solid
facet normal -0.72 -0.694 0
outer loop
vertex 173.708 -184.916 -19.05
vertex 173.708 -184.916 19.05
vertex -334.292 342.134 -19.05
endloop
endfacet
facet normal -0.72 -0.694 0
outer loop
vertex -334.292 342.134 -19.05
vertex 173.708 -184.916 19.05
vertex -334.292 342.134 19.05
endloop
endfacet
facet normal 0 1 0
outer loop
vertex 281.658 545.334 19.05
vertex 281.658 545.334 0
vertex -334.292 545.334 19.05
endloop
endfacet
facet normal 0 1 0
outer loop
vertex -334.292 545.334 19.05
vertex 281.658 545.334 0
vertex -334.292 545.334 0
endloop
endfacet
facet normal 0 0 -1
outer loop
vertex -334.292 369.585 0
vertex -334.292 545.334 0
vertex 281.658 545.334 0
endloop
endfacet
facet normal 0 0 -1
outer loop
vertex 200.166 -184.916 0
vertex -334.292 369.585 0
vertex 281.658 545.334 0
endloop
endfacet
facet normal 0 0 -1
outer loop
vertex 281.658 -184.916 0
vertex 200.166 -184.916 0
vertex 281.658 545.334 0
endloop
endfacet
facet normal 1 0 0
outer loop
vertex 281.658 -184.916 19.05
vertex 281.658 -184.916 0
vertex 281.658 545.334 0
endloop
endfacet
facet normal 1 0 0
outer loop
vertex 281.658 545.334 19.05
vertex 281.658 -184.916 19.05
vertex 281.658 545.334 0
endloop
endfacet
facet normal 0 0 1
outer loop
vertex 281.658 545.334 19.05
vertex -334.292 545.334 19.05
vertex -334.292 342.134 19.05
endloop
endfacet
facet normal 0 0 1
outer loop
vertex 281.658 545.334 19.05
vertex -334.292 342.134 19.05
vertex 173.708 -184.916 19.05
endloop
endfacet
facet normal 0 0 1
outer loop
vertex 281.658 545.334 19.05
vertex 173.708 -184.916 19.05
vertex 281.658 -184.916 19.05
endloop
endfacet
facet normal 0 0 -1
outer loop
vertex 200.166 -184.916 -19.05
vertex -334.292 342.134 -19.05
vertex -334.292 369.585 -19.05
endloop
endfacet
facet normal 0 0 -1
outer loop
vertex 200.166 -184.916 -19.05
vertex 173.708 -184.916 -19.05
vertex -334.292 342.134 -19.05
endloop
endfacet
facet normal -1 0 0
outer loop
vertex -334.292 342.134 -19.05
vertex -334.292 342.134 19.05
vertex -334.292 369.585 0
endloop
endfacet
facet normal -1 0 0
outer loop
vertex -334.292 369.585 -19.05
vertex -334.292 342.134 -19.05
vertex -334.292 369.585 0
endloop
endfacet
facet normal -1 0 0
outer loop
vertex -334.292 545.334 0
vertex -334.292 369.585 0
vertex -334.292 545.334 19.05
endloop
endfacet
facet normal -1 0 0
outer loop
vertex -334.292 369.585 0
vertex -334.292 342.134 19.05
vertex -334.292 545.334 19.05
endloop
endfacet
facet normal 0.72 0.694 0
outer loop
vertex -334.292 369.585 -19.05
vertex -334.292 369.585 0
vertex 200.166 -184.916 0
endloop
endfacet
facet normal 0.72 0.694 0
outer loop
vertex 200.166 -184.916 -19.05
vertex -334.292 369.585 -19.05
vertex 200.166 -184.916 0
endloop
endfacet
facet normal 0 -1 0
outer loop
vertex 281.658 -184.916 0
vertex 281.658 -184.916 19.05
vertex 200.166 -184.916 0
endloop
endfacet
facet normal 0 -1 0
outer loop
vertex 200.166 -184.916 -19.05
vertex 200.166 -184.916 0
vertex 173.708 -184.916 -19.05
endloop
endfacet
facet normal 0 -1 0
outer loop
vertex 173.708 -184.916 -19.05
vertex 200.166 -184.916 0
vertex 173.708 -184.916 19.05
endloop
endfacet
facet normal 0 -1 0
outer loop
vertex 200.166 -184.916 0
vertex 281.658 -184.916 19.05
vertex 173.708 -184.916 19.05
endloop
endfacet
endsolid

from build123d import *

# Parameters (mm, degrees)
F1_DEPTH = 19.05
F3_DEPTH = 19.05


with BuildPart() as f1:
    # F0 (on Top) → F1 (new body)
    with BuildSketch(Plane.XY):
        Polygon((281.657545, 545.334344), (-334.292455, 545.334344), (-334.292455, 342.134344), (173.707545, -184.915656), (281.657545, -184.915656), align=None)
    extrude(amount=F1_DEPTH)

    # F2 (on face) → F3 (join)
    with BuildSketch(Plane(origin=(0, 0, 0), x_dir=(1, 0, 0), z_dir=(0, 0, -1))):
        Polygon((-334.292455, -342.134344), (-334.292455, -369.5849), (200.165912, 184.915656), (173.707545, 184.915656), align=None)
    extrude(amount=F3_DEPTH)


solid = f1.part
